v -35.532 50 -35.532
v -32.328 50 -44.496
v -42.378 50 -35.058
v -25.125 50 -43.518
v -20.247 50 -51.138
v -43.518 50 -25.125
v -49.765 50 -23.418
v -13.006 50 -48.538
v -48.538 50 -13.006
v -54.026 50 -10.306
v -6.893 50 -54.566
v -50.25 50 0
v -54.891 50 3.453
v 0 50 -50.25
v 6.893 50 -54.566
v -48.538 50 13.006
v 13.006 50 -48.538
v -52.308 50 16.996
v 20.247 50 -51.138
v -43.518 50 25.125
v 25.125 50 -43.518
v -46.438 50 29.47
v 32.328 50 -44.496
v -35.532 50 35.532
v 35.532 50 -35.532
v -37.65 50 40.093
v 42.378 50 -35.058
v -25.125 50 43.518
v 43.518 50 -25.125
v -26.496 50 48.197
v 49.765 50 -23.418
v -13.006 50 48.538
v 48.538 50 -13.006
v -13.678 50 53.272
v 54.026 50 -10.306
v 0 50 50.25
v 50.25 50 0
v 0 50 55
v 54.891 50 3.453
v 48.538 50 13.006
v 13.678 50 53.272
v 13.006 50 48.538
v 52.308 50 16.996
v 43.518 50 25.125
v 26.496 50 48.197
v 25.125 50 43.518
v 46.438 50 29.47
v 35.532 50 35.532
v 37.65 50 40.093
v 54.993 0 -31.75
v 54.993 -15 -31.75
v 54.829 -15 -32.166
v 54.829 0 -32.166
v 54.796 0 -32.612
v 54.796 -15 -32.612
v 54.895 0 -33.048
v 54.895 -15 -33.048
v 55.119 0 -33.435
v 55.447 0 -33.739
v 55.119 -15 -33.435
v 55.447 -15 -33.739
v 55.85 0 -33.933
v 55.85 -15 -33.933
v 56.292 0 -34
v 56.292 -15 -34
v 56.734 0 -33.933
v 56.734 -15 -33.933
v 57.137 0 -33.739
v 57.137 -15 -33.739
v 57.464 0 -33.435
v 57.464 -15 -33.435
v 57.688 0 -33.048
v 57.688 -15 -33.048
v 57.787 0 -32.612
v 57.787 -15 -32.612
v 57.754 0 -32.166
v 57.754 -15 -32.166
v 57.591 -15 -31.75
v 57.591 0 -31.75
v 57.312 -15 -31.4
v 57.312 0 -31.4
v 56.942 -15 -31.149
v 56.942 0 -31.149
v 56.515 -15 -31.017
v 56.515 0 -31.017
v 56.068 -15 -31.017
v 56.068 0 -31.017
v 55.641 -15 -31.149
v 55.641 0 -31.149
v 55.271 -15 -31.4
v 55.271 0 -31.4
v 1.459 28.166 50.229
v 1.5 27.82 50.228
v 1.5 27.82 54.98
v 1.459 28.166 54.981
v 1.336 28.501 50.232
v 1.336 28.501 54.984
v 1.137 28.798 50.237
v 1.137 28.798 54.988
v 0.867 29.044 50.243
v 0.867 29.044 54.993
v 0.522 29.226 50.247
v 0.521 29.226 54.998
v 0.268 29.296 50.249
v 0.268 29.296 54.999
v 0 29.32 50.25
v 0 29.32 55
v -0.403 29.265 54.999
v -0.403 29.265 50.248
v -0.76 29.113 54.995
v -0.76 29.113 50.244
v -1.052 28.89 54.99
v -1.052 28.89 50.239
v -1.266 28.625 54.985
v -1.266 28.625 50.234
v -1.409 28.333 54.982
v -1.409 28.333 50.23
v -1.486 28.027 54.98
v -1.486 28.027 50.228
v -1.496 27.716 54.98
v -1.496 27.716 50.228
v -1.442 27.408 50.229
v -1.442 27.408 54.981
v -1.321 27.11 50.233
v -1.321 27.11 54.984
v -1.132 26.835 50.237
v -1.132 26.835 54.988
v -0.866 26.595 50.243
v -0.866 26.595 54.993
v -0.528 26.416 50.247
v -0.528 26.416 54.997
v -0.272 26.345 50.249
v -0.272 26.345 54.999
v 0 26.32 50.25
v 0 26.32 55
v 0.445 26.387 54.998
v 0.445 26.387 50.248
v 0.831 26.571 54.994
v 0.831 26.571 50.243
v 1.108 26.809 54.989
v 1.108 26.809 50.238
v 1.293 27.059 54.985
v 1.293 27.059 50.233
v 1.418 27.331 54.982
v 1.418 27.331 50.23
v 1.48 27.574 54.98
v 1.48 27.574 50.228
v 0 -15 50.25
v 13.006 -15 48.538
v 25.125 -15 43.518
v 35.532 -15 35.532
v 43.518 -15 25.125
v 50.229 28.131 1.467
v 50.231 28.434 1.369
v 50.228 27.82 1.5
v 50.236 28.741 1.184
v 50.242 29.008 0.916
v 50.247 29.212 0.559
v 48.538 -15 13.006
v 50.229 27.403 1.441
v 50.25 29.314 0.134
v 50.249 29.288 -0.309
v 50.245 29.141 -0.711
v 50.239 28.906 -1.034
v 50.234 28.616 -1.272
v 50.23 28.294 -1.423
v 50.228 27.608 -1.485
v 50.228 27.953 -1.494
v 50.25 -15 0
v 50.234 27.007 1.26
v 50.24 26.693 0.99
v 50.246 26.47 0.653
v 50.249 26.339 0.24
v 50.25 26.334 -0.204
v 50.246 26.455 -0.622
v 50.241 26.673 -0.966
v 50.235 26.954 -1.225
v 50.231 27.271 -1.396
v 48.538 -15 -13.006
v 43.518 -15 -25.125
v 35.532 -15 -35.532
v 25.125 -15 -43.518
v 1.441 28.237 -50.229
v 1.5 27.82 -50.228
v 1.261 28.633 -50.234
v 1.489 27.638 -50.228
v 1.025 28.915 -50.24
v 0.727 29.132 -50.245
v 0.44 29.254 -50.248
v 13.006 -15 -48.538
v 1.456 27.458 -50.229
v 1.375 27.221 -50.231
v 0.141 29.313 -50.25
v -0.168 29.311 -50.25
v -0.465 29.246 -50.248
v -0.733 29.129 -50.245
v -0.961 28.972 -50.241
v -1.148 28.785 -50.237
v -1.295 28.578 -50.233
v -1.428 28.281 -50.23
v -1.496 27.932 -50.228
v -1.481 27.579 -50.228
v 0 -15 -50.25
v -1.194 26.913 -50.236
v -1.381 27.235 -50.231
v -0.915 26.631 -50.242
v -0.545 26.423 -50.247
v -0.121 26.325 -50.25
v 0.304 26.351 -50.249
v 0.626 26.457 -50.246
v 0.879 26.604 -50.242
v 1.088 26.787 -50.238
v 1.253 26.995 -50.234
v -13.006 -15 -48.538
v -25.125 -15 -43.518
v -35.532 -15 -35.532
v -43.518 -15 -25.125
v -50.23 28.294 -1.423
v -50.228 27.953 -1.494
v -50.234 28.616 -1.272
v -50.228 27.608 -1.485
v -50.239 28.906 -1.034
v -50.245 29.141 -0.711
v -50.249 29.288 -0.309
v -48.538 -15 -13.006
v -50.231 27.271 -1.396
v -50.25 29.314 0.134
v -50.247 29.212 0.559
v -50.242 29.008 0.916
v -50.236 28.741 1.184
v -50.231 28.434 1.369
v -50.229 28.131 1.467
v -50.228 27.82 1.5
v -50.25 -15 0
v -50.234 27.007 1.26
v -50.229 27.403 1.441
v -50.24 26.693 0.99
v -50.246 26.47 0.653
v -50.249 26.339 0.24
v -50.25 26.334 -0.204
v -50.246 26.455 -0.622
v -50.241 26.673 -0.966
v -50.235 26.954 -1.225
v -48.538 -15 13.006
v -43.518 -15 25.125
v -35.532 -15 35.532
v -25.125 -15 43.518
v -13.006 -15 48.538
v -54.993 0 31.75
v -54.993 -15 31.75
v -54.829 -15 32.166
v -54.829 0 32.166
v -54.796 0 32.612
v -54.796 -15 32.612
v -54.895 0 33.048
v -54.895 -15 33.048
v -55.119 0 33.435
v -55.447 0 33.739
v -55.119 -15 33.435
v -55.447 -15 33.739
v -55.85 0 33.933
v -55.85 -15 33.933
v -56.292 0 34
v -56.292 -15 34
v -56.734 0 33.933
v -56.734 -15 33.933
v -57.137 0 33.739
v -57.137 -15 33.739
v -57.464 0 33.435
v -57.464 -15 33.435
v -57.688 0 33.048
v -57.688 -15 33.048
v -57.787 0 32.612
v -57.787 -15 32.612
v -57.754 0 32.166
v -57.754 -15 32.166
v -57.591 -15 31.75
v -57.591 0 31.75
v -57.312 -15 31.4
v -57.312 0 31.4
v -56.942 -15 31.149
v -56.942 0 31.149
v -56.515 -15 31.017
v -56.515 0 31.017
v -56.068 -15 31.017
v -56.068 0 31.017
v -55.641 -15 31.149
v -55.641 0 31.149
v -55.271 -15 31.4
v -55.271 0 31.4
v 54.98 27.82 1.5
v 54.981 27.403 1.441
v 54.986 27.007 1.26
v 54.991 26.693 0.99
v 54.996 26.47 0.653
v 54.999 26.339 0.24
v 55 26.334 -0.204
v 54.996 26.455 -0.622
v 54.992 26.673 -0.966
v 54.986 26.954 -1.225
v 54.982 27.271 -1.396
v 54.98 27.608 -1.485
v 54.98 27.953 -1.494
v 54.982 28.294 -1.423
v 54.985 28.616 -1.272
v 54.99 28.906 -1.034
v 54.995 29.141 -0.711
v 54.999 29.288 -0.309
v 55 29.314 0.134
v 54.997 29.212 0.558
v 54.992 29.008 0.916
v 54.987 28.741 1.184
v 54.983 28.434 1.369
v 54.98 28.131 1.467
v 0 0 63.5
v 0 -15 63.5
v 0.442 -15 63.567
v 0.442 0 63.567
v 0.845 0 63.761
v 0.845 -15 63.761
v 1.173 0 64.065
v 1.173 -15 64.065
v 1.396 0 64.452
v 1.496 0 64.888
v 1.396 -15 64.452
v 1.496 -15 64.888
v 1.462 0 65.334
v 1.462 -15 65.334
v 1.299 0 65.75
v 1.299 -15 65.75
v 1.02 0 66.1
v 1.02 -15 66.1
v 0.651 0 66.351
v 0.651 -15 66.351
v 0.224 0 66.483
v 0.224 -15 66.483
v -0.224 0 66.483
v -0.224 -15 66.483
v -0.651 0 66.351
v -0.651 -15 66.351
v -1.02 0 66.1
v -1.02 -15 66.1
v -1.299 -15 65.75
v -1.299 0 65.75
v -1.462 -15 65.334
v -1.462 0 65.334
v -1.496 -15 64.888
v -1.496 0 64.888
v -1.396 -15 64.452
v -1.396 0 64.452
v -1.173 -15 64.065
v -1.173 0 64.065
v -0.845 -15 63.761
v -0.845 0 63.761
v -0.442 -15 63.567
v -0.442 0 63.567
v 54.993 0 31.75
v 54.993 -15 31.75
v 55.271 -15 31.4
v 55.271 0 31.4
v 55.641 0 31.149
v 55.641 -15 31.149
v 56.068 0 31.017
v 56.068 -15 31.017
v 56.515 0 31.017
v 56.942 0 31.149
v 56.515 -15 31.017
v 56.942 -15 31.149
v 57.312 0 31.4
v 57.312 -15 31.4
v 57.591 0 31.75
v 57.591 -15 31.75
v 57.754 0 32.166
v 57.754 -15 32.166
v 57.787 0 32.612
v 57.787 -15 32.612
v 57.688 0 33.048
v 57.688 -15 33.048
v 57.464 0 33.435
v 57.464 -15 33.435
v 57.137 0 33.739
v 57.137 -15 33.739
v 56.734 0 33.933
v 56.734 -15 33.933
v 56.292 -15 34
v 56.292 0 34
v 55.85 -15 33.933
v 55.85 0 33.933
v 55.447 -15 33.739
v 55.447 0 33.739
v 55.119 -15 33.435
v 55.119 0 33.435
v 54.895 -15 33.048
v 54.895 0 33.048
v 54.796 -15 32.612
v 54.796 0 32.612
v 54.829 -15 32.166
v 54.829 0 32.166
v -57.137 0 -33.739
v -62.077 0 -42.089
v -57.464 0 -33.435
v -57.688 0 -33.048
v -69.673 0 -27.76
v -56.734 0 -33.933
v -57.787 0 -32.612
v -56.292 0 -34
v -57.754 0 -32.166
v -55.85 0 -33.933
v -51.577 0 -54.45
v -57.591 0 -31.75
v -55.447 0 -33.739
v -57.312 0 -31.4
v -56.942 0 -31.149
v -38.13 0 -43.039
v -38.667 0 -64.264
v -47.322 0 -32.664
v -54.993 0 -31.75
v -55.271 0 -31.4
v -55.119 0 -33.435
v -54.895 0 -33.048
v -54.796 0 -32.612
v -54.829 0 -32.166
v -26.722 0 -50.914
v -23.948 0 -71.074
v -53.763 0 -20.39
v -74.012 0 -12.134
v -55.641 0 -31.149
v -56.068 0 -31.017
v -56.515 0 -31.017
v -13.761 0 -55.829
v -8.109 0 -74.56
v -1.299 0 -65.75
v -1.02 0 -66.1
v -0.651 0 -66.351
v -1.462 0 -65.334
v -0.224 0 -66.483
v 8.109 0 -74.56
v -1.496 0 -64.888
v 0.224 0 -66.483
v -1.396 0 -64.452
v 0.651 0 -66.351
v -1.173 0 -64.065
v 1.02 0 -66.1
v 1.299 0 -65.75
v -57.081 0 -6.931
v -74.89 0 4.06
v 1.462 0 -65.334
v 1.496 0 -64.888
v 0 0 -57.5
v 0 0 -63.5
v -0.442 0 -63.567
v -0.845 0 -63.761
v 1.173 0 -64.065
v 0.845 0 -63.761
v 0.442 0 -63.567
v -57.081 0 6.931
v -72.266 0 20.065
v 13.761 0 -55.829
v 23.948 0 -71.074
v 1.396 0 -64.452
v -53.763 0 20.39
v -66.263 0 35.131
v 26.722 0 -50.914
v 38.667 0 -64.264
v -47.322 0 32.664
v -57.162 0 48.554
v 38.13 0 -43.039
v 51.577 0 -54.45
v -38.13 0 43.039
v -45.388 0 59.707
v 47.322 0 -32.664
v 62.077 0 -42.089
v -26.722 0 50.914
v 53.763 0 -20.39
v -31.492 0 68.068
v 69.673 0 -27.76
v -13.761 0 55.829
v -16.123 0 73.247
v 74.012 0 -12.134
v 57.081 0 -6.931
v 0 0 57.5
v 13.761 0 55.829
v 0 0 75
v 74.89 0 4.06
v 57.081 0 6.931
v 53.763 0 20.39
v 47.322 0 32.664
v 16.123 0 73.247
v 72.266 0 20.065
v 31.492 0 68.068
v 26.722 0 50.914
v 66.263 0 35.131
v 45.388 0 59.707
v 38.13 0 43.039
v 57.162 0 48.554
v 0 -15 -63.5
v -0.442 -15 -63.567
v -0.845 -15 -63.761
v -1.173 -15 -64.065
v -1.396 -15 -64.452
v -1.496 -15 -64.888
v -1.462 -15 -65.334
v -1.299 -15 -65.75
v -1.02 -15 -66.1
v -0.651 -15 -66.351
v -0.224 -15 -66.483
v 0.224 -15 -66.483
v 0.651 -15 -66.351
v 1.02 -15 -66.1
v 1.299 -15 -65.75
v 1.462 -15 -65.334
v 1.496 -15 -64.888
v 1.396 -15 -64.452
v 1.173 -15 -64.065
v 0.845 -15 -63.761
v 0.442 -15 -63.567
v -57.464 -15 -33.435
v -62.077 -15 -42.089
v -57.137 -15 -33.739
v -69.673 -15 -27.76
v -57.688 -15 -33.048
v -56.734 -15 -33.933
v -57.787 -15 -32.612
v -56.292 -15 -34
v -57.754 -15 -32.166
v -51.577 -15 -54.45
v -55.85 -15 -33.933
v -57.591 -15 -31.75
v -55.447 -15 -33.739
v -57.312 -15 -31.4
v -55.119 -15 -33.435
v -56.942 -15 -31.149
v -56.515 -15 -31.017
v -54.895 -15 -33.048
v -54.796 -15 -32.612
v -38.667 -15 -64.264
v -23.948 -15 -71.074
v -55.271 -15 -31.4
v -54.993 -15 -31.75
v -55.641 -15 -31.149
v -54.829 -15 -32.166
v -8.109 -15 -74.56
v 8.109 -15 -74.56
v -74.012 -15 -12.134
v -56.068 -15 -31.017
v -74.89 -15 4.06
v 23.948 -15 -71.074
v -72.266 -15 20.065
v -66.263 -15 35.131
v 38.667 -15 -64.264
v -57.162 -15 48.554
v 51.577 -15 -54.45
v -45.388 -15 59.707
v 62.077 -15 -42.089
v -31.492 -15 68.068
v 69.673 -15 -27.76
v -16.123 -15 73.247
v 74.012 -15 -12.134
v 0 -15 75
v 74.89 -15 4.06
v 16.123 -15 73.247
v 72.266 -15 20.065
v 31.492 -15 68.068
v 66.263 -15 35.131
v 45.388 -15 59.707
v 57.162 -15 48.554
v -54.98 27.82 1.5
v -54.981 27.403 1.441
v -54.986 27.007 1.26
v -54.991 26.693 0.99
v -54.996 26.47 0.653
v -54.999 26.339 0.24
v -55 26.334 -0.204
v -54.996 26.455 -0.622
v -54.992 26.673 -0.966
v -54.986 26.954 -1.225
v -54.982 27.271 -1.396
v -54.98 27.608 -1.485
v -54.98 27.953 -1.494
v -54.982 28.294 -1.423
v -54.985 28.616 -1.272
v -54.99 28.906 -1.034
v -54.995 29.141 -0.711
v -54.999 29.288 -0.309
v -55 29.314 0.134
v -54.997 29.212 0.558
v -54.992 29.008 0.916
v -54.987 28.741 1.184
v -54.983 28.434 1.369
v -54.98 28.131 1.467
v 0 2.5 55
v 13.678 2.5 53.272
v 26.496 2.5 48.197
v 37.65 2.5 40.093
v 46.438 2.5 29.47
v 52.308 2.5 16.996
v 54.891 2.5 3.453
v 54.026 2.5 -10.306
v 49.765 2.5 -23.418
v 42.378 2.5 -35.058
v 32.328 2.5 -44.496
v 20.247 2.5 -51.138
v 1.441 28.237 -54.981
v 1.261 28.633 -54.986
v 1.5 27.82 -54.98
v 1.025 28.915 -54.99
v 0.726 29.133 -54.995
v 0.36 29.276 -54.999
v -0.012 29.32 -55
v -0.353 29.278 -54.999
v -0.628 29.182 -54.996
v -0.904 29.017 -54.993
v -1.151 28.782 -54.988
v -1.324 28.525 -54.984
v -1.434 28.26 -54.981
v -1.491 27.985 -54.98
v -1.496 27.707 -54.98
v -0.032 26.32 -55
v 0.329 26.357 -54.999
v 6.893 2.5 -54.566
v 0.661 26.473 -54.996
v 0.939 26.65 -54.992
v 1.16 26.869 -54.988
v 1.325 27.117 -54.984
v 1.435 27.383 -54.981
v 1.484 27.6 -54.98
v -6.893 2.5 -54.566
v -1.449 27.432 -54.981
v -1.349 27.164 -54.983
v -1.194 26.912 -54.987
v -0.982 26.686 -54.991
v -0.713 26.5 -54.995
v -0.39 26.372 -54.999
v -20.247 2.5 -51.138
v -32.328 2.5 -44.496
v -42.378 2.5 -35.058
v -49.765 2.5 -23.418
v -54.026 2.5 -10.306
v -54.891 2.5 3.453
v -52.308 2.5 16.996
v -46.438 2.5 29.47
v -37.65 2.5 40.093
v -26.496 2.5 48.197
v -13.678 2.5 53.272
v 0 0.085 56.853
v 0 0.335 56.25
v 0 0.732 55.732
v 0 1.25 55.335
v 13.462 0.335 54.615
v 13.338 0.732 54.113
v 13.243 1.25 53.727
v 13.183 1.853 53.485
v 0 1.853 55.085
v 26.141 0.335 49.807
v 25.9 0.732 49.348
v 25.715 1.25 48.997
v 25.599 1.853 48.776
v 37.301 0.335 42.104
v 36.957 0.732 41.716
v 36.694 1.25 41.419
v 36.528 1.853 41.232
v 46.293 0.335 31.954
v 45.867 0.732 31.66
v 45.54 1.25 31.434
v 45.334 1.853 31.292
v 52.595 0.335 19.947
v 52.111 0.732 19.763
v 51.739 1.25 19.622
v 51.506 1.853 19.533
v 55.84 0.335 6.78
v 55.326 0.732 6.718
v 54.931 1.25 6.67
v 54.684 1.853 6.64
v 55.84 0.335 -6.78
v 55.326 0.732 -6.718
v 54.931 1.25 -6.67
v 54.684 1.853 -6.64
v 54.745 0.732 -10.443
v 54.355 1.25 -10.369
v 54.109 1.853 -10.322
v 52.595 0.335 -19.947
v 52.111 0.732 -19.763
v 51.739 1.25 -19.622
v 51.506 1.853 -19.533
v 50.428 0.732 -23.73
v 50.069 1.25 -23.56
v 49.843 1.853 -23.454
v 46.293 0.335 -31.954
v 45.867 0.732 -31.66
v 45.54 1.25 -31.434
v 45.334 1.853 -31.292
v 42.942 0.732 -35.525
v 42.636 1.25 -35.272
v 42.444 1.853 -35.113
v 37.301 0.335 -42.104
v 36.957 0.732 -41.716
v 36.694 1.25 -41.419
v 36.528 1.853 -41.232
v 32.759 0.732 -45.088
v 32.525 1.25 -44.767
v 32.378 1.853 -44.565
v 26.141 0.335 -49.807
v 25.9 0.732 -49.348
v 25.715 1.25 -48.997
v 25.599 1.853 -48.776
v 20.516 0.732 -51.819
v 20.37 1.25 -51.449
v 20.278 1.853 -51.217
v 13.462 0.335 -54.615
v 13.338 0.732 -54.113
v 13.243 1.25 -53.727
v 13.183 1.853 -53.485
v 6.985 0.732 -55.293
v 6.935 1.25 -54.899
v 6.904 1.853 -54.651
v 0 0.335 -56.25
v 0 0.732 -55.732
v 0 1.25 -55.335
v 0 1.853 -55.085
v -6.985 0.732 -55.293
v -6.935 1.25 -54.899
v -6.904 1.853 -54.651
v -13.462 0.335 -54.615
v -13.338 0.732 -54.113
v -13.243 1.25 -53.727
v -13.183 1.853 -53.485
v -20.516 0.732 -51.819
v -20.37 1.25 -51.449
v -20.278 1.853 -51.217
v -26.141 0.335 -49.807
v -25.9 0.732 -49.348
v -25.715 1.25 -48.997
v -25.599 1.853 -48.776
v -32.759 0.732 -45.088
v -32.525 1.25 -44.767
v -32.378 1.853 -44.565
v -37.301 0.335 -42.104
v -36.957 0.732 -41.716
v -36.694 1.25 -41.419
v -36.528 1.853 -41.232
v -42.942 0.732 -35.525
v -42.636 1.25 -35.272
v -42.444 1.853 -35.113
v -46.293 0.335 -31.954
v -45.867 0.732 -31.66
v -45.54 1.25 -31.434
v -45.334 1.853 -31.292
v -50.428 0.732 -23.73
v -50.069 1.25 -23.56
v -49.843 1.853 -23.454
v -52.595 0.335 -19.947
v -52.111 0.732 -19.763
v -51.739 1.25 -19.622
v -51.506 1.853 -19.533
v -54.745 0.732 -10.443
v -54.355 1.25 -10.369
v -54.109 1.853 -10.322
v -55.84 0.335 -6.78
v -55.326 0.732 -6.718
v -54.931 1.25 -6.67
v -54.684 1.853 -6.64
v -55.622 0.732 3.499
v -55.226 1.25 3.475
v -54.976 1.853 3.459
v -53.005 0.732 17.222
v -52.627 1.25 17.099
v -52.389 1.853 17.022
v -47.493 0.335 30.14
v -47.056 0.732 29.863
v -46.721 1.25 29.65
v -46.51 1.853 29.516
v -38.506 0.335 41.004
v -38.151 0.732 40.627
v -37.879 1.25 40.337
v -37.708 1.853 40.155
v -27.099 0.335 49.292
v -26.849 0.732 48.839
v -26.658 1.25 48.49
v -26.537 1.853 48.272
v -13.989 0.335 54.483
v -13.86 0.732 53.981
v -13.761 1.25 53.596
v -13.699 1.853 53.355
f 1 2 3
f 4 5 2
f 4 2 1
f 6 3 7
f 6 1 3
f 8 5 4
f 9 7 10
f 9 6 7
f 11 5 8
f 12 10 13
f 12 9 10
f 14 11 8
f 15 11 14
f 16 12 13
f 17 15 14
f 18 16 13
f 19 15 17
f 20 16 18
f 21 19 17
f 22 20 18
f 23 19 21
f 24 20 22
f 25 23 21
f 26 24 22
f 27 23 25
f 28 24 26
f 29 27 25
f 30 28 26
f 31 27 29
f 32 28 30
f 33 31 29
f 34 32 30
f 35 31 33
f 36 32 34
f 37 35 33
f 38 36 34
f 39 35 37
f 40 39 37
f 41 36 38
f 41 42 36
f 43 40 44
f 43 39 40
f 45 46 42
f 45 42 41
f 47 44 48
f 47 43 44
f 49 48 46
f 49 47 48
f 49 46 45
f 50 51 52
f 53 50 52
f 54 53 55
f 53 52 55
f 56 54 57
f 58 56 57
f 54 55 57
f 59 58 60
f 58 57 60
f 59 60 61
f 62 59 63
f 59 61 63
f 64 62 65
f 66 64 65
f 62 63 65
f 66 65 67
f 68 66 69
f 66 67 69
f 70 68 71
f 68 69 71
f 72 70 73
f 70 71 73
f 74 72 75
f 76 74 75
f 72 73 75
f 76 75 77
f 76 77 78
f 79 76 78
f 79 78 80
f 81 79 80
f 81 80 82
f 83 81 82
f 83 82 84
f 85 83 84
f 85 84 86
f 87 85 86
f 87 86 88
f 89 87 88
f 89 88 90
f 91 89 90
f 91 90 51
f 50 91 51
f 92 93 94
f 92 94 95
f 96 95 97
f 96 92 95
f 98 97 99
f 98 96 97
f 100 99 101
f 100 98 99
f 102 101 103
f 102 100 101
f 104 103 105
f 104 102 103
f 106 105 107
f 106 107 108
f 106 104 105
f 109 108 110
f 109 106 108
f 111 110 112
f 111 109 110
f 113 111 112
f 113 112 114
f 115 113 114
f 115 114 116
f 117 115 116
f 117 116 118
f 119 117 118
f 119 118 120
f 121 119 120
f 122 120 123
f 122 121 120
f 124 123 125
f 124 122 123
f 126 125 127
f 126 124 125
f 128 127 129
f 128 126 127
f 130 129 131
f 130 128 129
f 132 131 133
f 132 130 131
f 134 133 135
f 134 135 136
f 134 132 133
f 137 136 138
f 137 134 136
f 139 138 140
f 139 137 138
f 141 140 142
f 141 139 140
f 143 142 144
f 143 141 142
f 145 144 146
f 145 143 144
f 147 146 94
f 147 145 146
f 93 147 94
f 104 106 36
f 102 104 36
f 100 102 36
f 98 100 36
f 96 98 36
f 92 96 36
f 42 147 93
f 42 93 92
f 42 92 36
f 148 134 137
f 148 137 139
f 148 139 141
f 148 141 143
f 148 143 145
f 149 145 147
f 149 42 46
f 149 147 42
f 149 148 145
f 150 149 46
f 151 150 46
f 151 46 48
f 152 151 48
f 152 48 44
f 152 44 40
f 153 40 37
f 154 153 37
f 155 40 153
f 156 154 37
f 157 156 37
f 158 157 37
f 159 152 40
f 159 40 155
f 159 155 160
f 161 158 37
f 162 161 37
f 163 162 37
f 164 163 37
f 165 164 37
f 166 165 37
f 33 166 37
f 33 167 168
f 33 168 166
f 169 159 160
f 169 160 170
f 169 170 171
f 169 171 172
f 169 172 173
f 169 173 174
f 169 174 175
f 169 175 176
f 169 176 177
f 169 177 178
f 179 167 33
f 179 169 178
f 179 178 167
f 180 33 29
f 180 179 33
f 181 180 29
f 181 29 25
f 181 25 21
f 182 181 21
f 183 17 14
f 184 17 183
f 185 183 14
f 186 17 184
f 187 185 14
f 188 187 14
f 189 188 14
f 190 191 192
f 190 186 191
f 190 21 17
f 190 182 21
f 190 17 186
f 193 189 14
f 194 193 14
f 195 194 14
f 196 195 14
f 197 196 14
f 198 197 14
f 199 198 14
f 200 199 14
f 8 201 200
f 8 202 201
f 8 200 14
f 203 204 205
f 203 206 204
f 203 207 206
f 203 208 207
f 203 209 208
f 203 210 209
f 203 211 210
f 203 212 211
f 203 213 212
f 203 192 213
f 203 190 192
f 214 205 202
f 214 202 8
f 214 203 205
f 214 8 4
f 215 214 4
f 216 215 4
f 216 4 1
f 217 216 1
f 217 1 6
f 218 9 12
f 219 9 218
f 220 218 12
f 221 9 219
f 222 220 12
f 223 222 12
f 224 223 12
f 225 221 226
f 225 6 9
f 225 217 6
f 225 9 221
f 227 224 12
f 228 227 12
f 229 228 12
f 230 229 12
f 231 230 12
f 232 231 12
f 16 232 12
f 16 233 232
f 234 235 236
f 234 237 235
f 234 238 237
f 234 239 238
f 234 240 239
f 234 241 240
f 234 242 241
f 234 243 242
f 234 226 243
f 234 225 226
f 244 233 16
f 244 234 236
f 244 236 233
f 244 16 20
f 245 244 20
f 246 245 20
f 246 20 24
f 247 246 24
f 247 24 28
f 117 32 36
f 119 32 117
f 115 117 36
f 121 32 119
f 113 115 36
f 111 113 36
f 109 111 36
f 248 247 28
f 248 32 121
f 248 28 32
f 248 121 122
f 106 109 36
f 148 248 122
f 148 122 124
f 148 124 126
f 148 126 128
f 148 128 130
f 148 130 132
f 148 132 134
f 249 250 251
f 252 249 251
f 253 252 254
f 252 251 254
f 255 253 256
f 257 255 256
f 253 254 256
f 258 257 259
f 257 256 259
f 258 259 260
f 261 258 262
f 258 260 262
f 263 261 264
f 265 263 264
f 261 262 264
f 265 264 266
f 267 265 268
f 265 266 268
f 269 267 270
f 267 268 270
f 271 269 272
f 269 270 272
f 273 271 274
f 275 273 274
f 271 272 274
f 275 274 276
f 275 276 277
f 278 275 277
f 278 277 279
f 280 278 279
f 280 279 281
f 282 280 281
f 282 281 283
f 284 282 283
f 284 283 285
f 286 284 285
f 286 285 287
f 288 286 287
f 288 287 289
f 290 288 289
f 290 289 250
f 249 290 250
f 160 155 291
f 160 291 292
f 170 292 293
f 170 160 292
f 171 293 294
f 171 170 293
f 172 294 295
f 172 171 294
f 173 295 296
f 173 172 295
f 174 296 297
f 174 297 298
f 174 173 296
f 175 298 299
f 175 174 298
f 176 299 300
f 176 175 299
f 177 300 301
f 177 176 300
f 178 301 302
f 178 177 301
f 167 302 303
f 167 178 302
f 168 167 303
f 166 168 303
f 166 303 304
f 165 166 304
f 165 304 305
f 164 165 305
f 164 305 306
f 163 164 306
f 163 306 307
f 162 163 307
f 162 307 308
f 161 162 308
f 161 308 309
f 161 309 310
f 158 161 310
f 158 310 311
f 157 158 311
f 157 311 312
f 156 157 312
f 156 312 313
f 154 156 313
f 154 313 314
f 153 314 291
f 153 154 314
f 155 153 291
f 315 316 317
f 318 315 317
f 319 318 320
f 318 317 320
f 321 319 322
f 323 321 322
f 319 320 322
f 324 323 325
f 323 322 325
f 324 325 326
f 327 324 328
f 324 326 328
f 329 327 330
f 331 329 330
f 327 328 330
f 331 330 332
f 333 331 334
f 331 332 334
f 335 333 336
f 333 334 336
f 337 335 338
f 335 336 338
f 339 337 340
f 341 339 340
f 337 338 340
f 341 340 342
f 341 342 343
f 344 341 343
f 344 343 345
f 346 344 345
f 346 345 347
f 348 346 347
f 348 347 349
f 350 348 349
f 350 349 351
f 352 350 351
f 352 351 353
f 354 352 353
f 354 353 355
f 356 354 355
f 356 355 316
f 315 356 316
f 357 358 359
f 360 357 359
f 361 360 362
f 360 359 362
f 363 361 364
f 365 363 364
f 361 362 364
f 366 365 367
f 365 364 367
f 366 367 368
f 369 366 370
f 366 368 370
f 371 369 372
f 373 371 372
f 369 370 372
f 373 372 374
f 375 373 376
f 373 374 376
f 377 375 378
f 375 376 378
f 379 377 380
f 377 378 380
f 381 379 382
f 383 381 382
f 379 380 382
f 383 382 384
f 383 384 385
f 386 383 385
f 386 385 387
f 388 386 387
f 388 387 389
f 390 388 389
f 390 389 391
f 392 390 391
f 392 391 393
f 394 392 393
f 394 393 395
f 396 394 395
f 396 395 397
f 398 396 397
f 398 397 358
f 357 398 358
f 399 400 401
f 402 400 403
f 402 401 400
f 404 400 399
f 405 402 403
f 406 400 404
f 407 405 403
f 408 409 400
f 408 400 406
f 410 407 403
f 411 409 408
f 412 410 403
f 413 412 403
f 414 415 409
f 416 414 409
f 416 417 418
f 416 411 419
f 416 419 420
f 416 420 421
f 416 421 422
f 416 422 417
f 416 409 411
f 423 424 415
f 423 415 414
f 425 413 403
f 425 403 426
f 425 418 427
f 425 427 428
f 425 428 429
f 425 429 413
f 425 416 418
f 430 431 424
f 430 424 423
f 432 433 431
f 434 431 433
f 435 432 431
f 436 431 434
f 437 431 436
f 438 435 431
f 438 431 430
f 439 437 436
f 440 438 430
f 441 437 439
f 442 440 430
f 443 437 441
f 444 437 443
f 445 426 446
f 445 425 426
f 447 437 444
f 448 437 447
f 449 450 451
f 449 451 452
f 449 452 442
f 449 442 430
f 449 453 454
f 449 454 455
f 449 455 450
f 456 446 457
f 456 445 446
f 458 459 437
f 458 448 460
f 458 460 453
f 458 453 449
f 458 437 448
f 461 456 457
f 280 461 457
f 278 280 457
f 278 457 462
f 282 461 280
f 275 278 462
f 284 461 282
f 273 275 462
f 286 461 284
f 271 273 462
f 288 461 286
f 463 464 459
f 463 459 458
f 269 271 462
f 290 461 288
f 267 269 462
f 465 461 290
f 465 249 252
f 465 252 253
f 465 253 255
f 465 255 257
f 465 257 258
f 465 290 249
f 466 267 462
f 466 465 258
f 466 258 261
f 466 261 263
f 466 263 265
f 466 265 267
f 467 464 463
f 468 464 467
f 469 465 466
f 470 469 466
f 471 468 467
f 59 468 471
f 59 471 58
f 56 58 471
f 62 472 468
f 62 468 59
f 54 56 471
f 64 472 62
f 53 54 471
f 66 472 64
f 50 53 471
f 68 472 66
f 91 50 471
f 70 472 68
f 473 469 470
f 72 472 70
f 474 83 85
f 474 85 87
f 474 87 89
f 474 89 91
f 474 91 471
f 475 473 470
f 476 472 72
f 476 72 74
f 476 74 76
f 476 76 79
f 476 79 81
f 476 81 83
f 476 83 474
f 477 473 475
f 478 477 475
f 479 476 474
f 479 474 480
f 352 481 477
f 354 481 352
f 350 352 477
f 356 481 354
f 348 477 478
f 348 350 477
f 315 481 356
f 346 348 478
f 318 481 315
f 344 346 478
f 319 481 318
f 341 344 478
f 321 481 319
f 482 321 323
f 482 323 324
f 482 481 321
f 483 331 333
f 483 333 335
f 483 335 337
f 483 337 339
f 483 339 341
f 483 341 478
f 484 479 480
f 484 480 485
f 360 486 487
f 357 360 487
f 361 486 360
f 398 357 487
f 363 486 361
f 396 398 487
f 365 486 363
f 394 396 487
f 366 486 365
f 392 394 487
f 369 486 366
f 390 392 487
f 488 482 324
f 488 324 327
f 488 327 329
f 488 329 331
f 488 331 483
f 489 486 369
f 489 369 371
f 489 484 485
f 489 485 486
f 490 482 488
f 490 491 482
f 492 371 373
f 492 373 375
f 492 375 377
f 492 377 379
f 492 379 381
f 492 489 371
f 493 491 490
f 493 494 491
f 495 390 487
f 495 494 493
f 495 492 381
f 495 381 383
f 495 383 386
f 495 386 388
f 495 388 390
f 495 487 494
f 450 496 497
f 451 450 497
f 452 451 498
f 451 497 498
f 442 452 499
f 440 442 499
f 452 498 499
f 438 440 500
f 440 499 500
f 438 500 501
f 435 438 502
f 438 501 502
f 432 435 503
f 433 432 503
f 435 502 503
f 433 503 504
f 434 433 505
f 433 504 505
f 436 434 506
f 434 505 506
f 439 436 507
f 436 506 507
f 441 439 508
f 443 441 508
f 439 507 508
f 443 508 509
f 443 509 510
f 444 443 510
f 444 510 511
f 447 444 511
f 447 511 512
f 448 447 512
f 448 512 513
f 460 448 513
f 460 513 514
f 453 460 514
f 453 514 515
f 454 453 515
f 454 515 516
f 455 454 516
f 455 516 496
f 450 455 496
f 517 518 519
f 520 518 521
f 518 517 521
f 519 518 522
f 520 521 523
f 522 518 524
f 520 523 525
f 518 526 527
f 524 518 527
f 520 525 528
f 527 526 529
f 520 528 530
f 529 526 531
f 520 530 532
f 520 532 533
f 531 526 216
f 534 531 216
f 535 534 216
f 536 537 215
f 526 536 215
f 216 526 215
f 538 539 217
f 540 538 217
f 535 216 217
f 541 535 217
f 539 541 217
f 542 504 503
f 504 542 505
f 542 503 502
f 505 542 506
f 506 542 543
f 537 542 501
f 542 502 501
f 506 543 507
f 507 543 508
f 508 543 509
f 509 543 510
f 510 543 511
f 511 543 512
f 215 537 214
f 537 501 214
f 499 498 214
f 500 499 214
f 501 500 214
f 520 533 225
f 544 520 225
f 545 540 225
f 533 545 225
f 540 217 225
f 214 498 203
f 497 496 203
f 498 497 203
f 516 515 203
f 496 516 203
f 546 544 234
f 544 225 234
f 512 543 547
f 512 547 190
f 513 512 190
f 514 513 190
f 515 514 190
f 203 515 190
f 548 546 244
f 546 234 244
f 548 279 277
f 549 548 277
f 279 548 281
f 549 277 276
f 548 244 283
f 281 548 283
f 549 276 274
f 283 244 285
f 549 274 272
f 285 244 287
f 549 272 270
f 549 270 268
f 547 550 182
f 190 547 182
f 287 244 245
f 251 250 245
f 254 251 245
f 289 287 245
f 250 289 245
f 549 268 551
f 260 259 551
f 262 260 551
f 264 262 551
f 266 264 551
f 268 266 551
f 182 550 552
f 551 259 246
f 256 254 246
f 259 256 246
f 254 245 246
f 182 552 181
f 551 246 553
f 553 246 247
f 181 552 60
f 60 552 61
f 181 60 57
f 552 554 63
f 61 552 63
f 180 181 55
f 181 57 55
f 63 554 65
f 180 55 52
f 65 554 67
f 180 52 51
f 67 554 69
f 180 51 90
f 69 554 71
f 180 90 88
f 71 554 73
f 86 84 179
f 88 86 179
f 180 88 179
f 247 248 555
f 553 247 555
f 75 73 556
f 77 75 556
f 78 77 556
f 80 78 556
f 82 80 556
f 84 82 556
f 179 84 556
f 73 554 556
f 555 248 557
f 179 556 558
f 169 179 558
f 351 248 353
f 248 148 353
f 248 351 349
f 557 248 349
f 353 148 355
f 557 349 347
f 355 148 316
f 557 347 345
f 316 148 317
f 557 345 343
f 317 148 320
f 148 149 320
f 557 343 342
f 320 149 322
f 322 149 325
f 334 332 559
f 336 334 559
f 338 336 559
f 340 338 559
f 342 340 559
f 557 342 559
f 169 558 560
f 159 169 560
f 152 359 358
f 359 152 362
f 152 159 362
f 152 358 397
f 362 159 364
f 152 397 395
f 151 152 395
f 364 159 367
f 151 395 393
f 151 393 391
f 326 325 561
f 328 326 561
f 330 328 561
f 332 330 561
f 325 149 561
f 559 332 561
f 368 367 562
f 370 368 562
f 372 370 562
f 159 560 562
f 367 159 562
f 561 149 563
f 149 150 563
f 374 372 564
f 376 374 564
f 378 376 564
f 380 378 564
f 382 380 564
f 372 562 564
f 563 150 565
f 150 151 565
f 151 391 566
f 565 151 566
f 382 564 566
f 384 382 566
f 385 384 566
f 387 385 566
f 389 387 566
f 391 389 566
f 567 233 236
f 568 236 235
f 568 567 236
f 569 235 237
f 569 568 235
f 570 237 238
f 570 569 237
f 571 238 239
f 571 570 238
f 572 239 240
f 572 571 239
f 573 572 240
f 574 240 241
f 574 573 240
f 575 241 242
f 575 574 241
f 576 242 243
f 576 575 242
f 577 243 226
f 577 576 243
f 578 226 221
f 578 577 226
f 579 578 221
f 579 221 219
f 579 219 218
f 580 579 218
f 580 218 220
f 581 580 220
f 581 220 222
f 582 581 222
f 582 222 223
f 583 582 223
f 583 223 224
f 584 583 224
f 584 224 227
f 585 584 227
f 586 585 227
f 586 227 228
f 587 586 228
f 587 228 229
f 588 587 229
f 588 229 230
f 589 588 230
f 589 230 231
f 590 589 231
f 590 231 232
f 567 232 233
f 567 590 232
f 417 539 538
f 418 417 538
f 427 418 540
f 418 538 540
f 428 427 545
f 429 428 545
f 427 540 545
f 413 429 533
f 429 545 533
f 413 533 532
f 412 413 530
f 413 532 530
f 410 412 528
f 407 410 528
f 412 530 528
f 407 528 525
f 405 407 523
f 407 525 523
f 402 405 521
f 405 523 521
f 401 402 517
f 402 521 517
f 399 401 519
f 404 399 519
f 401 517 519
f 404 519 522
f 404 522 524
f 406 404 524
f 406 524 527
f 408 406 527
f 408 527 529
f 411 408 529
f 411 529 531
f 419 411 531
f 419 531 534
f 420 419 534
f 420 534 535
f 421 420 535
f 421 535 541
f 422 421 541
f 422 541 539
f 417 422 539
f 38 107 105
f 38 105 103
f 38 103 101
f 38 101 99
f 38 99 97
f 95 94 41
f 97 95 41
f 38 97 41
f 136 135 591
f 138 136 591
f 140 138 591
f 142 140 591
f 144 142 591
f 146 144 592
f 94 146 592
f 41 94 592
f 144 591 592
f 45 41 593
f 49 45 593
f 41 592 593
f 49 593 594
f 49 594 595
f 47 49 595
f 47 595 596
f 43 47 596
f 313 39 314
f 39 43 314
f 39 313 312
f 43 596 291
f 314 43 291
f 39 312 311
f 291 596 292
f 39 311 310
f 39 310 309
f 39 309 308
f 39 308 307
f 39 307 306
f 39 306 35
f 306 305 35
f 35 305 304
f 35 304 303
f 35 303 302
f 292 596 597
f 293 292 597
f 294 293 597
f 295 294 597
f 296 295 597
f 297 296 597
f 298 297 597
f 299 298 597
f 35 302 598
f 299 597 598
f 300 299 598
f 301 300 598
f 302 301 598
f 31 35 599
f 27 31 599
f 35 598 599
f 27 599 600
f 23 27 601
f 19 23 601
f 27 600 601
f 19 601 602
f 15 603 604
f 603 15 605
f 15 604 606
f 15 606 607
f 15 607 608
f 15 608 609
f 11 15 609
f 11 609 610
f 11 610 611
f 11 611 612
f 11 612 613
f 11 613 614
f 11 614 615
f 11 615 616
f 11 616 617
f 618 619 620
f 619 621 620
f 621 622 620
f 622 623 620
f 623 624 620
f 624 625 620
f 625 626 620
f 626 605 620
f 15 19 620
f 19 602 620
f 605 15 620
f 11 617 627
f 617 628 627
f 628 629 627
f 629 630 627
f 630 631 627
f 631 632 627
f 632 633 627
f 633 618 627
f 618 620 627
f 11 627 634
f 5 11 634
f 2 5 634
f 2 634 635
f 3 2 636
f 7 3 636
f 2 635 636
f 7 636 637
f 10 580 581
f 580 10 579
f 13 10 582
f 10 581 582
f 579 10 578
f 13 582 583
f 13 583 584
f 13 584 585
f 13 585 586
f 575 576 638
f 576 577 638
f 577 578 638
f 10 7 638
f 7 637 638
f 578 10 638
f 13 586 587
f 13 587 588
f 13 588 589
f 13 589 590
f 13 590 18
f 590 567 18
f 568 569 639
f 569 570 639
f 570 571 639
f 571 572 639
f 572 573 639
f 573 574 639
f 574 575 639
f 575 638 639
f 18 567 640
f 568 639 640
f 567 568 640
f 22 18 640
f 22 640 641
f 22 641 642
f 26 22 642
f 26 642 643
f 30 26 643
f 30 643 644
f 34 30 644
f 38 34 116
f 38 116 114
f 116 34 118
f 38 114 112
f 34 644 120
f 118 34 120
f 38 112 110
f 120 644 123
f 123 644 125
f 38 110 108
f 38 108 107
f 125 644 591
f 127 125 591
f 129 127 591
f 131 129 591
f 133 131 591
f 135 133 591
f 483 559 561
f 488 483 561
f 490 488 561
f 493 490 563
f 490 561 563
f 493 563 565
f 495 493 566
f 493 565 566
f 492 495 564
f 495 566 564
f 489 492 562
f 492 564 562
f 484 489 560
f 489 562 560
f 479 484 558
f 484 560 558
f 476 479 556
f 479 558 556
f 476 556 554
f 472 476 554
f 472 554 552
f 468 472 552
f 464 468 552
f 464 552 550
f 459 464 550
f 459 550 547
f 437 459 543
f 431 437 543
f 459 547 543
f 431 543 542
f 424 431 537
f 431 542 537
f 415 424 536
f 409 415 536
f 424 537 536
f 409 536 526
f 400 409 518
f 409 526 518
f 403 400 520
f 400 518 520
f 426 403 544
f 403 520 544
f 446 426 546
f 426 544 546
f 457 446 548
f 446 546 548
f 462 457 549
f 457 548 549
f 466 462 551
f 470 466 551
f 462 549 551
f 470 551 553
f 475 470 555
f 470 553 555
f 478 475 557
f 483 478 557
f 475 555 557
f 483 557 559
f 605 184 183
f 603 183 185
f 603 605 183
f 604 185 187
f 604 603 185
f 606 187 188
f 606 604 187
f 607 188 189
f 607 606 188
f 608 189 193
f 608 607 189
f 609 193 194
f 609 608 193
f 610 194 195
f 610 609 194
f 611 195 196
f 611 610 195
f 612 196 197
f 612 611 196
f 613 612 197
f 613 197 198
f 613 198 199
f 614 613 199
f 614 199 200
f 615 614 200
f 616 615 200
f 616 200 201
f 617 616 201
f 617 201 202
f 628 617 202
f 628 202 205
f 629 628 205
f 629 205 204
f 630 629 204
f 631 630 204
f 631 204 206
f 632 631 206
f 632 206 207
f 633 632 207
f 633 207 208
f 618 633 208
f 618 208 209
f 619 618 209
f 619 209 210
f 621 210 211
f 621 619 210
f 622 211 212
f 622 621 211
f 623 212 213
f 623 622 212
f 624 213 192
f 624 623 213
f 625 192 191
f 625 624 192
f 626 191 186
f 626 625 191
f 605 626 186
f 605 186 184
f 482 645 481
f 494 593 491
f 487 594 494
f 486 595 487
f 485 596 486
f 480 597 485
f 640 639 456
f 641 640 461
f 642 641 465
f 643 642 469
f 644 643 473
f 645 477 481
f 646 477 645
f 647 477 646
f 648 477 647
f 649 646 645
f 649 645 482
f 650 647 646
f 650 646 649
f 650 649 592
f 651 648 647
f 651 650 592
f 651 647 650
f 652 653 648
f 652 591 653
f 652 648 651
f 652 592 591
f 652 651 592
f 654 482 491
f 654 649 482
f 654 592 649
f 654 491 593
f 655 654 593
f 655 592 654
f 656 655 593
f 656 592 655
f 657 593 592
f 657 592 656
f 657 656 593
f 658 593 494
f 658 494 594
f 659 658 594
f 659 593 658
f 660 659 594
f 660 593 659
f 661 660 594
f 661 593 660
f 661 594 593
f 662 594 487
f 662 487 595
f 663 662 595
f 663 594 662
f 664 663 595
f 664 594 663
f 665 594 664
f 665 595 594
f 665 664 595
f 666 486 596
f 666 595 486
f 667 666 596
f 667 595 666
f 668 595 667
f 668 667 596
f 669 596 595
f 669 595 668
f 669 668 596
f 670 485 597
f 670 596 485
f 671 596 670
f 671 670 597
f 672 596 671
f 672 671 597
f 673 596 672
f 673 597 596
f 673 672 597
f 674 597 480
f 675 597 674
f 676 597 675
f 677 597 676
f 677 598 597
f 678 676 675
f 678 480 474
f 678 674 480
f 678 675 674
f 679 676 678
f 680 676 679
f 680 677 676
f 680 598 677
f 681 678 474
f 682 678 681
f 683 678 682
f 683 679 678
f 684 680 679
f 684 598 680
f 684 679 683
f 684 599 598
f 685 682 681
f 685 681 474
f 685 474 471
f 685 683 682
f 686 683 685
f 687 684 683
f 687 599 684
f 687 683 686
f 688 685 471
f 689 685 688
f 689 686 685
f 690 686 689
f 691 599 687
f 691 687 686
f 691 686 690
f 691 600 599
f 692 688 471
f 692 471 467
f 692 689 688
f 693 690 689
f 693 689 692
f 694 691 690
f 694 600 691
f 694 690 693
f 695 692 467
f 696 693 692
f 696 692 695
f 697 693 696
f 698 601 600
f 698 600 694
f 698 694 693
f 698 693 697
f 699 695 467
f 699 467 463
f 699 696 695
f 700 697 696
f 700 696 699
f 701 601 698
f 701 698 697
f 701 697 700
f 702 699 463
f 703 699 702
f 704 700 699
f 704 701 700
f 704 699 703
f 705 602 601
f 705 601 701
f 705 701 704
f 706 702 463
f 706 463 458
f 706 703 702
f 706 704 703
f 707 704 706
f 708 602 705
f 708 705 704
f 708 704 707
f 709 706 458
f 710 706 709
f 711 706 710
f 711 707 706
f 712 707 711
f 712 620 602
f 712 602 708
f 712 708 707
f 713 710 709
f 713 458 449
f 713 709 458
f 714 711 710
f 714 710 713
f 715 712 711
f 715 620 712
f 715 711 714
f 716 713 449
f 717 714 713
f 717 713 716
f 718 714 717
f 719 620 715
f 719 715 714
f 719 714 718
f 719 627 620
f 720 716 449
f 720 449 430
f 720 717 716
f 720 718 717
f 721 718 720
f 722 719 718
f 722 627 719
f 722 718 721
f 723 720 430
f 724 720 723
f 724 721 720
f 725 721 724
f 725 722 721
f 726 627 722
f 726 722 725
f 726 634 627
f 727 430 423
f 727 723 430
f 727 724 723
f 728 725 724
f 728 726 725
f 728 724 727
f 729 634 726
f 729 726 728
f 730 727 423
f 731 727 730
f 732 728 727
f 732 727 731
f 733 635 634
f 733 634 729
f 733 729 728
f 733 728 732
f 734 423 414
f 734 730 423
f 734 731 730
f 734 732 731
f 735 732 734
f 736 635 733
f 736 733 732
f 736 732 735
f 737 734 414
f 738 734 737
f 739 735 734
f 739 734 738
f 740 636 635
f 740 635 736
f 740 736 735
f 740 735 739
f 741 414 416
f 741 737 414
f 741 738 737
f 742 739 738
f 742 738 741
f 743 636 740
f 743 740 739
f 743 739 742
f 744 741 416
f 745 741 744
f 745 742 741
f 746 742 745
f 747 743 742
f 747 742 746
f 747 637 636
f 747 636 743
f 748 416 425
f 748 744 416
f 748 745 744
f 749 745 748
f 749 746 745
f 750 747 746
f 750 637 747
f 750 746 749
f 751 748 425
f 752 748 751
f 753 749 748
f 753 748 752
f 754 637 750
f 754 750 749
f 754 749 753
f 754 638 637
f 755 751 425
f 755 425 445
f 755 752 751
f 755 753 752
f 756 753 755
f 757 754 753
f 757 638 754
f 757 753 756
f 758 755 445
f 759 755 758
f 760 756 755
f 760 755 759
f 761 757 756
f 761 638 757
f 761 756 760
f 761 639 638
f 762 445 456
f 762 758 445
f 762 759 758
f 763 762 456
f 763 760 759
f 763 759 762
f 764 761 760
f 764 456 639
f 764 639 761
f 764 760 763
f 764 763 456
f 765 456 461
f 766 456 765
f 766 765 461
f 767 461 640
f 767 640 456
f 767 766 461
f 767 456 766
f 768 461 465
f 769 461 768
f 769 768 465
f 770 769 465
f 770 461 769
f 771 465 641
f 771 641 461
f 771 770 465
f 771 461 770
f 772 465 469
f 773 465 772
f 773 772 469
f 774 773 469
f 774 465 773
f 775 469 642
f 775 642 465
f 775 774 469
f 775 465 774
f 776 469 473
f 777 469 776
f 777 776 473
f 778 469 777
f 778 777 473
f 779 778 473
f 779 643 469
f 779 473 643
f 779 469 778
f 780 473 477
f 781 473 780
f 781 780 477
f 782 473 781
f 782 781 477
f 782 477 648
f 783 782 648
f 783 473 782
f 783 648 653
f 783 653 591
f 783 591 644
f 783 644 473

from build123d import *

# Parameters (mm, degrees)
SKETCH5_R               = 55
SKETCH5_R_2             = 50.25
BOSS_EXTRUDE1_DEPTH     = 50
CUT_EXTRUDE1_DEPTH      = 211
CUT_EXTRUDE1_DEPTH_BACK = 106
SKETCH8_R               = 1.5
CUT_EXTRUDE2_DEPTH      = 93.466210222
CUT_EXTRUDE2_DEPTH_BACK = 93.466210222
SKETCH9_R               = 1.5
SKETCH14_R              = 75
SKETCH14_R_2            = 50.25
BOSS_EXTRUDE4_DEPTH     = 15
FILLET3_R               = 2.5
SKETCH15_R              = 1.5
CUT_EXTRUDE3_DEPTH      = 125.398553098
CIRPATTERN1_COUNT       = 6


with BuildPart() as part:
    # Sketch5 → Boss-Extrude1 (new body)
    with BuildSketch(Plane(origin=(0, 0, 0), x_dir=(1, 0, 0), z_dir=(0, 1, 0))):
        with Locations(Location((0, 0, 0), (0, 0, 270))):
            Circle(SKETCH5_R)
        with Locations(Location((0, 0, 0), (0, 0, 270))):
            Circle(SKETCH5_R_2, mode=Mode.SUBTRACT)
    extrude(amount=BOSS_EXTRUDE1_DEPTH)

    # Sketch8 → Cut-Extrude1 (cut, two sides: drawn at the far end of the back side and taken through both)
    with BuildSketch(Plane(origin=(0, 0, 0), x_dir=(0, 0, -1), z_dir=(1, 0, 0)).offset(-CUT_EXTRUDE1_DEPTH_BACK)):
        with Locations(Location((0, 27.82, 0), (0, 0, 180))):
            Circle(SKETCH8_R)
    extrude(amount=CUT_EXTRUDE1_DEPTH + CUT_EXTRUDE1_DEPTH_BACK, mode=Mode.SUBTRACT)

    # Sketch9 → Cut-Extrude2 (cut, two sides: drawn at the far end of the back side and taken through both)
    with BuildSketch(Plane.XY.offset(-CUT_EXTRUDE2_DEPTH_BACK)):
        with Locations((0, 27.82)):
            Circle(SKETCH9_R)
    extrude(amount=CUT_EXTRUDE2_DEPTH + CUT_EXTRUDE2_DEPTH_BACK, mode=Mode.SUBTRACT)

    # Sketch14 → Boss-Extrude4 (add)
    with BuildSketch(Plane(origin=(0, -15, 0), x_dir=(1, 0, 0), z_dir=(0, 1, 0))):
        with Locations(Location((0, 0, 0), (0, 0, 270))):
            Circle(SKETCH14_R)
        with Locations(Location((0, 0, 0), (0, 0, 270))):
            Circle(SKETCH14_R_2, mode=Mode.SUBTRACT)
    extrude(amount=BOSS_EXTRUDE4_DEPTH)

    # Fillet3
    fillet3_edges = [part.edges().sort_by_distance(p)[0] for p in [
        (0, 0, -55),
    ]]
    fillet(fillet3_edges, radius=FILLET3_R)

    # Sketch15 → Cut-Extrude3 (cut, through all)
    with BuildSketch(Plane.XZ.offset(15)):
        with Locations(Location((0, 65, 0), (0, 0, 270))):
            Circle(SKETCH15_R)
    cut_extrude3 = extrude(amount=-CUT_EXTRUDE3_DEPTH, mode=Mode.SUBTRACT)

    # CirPattern1: Cut-Extrude3 ×6 about axis
    cirpattern1_axis = Axis((0, 0, 0), (0, 1, 0))
    for i in range(1, CIRPATTERN1_COUNT):
        add(cut_extrude3.rotate(cirpattern1_axis, i * 360 / CIRPATTERN1_COUNT), mode=Mode.SUBTRACT)


solid = part.part
